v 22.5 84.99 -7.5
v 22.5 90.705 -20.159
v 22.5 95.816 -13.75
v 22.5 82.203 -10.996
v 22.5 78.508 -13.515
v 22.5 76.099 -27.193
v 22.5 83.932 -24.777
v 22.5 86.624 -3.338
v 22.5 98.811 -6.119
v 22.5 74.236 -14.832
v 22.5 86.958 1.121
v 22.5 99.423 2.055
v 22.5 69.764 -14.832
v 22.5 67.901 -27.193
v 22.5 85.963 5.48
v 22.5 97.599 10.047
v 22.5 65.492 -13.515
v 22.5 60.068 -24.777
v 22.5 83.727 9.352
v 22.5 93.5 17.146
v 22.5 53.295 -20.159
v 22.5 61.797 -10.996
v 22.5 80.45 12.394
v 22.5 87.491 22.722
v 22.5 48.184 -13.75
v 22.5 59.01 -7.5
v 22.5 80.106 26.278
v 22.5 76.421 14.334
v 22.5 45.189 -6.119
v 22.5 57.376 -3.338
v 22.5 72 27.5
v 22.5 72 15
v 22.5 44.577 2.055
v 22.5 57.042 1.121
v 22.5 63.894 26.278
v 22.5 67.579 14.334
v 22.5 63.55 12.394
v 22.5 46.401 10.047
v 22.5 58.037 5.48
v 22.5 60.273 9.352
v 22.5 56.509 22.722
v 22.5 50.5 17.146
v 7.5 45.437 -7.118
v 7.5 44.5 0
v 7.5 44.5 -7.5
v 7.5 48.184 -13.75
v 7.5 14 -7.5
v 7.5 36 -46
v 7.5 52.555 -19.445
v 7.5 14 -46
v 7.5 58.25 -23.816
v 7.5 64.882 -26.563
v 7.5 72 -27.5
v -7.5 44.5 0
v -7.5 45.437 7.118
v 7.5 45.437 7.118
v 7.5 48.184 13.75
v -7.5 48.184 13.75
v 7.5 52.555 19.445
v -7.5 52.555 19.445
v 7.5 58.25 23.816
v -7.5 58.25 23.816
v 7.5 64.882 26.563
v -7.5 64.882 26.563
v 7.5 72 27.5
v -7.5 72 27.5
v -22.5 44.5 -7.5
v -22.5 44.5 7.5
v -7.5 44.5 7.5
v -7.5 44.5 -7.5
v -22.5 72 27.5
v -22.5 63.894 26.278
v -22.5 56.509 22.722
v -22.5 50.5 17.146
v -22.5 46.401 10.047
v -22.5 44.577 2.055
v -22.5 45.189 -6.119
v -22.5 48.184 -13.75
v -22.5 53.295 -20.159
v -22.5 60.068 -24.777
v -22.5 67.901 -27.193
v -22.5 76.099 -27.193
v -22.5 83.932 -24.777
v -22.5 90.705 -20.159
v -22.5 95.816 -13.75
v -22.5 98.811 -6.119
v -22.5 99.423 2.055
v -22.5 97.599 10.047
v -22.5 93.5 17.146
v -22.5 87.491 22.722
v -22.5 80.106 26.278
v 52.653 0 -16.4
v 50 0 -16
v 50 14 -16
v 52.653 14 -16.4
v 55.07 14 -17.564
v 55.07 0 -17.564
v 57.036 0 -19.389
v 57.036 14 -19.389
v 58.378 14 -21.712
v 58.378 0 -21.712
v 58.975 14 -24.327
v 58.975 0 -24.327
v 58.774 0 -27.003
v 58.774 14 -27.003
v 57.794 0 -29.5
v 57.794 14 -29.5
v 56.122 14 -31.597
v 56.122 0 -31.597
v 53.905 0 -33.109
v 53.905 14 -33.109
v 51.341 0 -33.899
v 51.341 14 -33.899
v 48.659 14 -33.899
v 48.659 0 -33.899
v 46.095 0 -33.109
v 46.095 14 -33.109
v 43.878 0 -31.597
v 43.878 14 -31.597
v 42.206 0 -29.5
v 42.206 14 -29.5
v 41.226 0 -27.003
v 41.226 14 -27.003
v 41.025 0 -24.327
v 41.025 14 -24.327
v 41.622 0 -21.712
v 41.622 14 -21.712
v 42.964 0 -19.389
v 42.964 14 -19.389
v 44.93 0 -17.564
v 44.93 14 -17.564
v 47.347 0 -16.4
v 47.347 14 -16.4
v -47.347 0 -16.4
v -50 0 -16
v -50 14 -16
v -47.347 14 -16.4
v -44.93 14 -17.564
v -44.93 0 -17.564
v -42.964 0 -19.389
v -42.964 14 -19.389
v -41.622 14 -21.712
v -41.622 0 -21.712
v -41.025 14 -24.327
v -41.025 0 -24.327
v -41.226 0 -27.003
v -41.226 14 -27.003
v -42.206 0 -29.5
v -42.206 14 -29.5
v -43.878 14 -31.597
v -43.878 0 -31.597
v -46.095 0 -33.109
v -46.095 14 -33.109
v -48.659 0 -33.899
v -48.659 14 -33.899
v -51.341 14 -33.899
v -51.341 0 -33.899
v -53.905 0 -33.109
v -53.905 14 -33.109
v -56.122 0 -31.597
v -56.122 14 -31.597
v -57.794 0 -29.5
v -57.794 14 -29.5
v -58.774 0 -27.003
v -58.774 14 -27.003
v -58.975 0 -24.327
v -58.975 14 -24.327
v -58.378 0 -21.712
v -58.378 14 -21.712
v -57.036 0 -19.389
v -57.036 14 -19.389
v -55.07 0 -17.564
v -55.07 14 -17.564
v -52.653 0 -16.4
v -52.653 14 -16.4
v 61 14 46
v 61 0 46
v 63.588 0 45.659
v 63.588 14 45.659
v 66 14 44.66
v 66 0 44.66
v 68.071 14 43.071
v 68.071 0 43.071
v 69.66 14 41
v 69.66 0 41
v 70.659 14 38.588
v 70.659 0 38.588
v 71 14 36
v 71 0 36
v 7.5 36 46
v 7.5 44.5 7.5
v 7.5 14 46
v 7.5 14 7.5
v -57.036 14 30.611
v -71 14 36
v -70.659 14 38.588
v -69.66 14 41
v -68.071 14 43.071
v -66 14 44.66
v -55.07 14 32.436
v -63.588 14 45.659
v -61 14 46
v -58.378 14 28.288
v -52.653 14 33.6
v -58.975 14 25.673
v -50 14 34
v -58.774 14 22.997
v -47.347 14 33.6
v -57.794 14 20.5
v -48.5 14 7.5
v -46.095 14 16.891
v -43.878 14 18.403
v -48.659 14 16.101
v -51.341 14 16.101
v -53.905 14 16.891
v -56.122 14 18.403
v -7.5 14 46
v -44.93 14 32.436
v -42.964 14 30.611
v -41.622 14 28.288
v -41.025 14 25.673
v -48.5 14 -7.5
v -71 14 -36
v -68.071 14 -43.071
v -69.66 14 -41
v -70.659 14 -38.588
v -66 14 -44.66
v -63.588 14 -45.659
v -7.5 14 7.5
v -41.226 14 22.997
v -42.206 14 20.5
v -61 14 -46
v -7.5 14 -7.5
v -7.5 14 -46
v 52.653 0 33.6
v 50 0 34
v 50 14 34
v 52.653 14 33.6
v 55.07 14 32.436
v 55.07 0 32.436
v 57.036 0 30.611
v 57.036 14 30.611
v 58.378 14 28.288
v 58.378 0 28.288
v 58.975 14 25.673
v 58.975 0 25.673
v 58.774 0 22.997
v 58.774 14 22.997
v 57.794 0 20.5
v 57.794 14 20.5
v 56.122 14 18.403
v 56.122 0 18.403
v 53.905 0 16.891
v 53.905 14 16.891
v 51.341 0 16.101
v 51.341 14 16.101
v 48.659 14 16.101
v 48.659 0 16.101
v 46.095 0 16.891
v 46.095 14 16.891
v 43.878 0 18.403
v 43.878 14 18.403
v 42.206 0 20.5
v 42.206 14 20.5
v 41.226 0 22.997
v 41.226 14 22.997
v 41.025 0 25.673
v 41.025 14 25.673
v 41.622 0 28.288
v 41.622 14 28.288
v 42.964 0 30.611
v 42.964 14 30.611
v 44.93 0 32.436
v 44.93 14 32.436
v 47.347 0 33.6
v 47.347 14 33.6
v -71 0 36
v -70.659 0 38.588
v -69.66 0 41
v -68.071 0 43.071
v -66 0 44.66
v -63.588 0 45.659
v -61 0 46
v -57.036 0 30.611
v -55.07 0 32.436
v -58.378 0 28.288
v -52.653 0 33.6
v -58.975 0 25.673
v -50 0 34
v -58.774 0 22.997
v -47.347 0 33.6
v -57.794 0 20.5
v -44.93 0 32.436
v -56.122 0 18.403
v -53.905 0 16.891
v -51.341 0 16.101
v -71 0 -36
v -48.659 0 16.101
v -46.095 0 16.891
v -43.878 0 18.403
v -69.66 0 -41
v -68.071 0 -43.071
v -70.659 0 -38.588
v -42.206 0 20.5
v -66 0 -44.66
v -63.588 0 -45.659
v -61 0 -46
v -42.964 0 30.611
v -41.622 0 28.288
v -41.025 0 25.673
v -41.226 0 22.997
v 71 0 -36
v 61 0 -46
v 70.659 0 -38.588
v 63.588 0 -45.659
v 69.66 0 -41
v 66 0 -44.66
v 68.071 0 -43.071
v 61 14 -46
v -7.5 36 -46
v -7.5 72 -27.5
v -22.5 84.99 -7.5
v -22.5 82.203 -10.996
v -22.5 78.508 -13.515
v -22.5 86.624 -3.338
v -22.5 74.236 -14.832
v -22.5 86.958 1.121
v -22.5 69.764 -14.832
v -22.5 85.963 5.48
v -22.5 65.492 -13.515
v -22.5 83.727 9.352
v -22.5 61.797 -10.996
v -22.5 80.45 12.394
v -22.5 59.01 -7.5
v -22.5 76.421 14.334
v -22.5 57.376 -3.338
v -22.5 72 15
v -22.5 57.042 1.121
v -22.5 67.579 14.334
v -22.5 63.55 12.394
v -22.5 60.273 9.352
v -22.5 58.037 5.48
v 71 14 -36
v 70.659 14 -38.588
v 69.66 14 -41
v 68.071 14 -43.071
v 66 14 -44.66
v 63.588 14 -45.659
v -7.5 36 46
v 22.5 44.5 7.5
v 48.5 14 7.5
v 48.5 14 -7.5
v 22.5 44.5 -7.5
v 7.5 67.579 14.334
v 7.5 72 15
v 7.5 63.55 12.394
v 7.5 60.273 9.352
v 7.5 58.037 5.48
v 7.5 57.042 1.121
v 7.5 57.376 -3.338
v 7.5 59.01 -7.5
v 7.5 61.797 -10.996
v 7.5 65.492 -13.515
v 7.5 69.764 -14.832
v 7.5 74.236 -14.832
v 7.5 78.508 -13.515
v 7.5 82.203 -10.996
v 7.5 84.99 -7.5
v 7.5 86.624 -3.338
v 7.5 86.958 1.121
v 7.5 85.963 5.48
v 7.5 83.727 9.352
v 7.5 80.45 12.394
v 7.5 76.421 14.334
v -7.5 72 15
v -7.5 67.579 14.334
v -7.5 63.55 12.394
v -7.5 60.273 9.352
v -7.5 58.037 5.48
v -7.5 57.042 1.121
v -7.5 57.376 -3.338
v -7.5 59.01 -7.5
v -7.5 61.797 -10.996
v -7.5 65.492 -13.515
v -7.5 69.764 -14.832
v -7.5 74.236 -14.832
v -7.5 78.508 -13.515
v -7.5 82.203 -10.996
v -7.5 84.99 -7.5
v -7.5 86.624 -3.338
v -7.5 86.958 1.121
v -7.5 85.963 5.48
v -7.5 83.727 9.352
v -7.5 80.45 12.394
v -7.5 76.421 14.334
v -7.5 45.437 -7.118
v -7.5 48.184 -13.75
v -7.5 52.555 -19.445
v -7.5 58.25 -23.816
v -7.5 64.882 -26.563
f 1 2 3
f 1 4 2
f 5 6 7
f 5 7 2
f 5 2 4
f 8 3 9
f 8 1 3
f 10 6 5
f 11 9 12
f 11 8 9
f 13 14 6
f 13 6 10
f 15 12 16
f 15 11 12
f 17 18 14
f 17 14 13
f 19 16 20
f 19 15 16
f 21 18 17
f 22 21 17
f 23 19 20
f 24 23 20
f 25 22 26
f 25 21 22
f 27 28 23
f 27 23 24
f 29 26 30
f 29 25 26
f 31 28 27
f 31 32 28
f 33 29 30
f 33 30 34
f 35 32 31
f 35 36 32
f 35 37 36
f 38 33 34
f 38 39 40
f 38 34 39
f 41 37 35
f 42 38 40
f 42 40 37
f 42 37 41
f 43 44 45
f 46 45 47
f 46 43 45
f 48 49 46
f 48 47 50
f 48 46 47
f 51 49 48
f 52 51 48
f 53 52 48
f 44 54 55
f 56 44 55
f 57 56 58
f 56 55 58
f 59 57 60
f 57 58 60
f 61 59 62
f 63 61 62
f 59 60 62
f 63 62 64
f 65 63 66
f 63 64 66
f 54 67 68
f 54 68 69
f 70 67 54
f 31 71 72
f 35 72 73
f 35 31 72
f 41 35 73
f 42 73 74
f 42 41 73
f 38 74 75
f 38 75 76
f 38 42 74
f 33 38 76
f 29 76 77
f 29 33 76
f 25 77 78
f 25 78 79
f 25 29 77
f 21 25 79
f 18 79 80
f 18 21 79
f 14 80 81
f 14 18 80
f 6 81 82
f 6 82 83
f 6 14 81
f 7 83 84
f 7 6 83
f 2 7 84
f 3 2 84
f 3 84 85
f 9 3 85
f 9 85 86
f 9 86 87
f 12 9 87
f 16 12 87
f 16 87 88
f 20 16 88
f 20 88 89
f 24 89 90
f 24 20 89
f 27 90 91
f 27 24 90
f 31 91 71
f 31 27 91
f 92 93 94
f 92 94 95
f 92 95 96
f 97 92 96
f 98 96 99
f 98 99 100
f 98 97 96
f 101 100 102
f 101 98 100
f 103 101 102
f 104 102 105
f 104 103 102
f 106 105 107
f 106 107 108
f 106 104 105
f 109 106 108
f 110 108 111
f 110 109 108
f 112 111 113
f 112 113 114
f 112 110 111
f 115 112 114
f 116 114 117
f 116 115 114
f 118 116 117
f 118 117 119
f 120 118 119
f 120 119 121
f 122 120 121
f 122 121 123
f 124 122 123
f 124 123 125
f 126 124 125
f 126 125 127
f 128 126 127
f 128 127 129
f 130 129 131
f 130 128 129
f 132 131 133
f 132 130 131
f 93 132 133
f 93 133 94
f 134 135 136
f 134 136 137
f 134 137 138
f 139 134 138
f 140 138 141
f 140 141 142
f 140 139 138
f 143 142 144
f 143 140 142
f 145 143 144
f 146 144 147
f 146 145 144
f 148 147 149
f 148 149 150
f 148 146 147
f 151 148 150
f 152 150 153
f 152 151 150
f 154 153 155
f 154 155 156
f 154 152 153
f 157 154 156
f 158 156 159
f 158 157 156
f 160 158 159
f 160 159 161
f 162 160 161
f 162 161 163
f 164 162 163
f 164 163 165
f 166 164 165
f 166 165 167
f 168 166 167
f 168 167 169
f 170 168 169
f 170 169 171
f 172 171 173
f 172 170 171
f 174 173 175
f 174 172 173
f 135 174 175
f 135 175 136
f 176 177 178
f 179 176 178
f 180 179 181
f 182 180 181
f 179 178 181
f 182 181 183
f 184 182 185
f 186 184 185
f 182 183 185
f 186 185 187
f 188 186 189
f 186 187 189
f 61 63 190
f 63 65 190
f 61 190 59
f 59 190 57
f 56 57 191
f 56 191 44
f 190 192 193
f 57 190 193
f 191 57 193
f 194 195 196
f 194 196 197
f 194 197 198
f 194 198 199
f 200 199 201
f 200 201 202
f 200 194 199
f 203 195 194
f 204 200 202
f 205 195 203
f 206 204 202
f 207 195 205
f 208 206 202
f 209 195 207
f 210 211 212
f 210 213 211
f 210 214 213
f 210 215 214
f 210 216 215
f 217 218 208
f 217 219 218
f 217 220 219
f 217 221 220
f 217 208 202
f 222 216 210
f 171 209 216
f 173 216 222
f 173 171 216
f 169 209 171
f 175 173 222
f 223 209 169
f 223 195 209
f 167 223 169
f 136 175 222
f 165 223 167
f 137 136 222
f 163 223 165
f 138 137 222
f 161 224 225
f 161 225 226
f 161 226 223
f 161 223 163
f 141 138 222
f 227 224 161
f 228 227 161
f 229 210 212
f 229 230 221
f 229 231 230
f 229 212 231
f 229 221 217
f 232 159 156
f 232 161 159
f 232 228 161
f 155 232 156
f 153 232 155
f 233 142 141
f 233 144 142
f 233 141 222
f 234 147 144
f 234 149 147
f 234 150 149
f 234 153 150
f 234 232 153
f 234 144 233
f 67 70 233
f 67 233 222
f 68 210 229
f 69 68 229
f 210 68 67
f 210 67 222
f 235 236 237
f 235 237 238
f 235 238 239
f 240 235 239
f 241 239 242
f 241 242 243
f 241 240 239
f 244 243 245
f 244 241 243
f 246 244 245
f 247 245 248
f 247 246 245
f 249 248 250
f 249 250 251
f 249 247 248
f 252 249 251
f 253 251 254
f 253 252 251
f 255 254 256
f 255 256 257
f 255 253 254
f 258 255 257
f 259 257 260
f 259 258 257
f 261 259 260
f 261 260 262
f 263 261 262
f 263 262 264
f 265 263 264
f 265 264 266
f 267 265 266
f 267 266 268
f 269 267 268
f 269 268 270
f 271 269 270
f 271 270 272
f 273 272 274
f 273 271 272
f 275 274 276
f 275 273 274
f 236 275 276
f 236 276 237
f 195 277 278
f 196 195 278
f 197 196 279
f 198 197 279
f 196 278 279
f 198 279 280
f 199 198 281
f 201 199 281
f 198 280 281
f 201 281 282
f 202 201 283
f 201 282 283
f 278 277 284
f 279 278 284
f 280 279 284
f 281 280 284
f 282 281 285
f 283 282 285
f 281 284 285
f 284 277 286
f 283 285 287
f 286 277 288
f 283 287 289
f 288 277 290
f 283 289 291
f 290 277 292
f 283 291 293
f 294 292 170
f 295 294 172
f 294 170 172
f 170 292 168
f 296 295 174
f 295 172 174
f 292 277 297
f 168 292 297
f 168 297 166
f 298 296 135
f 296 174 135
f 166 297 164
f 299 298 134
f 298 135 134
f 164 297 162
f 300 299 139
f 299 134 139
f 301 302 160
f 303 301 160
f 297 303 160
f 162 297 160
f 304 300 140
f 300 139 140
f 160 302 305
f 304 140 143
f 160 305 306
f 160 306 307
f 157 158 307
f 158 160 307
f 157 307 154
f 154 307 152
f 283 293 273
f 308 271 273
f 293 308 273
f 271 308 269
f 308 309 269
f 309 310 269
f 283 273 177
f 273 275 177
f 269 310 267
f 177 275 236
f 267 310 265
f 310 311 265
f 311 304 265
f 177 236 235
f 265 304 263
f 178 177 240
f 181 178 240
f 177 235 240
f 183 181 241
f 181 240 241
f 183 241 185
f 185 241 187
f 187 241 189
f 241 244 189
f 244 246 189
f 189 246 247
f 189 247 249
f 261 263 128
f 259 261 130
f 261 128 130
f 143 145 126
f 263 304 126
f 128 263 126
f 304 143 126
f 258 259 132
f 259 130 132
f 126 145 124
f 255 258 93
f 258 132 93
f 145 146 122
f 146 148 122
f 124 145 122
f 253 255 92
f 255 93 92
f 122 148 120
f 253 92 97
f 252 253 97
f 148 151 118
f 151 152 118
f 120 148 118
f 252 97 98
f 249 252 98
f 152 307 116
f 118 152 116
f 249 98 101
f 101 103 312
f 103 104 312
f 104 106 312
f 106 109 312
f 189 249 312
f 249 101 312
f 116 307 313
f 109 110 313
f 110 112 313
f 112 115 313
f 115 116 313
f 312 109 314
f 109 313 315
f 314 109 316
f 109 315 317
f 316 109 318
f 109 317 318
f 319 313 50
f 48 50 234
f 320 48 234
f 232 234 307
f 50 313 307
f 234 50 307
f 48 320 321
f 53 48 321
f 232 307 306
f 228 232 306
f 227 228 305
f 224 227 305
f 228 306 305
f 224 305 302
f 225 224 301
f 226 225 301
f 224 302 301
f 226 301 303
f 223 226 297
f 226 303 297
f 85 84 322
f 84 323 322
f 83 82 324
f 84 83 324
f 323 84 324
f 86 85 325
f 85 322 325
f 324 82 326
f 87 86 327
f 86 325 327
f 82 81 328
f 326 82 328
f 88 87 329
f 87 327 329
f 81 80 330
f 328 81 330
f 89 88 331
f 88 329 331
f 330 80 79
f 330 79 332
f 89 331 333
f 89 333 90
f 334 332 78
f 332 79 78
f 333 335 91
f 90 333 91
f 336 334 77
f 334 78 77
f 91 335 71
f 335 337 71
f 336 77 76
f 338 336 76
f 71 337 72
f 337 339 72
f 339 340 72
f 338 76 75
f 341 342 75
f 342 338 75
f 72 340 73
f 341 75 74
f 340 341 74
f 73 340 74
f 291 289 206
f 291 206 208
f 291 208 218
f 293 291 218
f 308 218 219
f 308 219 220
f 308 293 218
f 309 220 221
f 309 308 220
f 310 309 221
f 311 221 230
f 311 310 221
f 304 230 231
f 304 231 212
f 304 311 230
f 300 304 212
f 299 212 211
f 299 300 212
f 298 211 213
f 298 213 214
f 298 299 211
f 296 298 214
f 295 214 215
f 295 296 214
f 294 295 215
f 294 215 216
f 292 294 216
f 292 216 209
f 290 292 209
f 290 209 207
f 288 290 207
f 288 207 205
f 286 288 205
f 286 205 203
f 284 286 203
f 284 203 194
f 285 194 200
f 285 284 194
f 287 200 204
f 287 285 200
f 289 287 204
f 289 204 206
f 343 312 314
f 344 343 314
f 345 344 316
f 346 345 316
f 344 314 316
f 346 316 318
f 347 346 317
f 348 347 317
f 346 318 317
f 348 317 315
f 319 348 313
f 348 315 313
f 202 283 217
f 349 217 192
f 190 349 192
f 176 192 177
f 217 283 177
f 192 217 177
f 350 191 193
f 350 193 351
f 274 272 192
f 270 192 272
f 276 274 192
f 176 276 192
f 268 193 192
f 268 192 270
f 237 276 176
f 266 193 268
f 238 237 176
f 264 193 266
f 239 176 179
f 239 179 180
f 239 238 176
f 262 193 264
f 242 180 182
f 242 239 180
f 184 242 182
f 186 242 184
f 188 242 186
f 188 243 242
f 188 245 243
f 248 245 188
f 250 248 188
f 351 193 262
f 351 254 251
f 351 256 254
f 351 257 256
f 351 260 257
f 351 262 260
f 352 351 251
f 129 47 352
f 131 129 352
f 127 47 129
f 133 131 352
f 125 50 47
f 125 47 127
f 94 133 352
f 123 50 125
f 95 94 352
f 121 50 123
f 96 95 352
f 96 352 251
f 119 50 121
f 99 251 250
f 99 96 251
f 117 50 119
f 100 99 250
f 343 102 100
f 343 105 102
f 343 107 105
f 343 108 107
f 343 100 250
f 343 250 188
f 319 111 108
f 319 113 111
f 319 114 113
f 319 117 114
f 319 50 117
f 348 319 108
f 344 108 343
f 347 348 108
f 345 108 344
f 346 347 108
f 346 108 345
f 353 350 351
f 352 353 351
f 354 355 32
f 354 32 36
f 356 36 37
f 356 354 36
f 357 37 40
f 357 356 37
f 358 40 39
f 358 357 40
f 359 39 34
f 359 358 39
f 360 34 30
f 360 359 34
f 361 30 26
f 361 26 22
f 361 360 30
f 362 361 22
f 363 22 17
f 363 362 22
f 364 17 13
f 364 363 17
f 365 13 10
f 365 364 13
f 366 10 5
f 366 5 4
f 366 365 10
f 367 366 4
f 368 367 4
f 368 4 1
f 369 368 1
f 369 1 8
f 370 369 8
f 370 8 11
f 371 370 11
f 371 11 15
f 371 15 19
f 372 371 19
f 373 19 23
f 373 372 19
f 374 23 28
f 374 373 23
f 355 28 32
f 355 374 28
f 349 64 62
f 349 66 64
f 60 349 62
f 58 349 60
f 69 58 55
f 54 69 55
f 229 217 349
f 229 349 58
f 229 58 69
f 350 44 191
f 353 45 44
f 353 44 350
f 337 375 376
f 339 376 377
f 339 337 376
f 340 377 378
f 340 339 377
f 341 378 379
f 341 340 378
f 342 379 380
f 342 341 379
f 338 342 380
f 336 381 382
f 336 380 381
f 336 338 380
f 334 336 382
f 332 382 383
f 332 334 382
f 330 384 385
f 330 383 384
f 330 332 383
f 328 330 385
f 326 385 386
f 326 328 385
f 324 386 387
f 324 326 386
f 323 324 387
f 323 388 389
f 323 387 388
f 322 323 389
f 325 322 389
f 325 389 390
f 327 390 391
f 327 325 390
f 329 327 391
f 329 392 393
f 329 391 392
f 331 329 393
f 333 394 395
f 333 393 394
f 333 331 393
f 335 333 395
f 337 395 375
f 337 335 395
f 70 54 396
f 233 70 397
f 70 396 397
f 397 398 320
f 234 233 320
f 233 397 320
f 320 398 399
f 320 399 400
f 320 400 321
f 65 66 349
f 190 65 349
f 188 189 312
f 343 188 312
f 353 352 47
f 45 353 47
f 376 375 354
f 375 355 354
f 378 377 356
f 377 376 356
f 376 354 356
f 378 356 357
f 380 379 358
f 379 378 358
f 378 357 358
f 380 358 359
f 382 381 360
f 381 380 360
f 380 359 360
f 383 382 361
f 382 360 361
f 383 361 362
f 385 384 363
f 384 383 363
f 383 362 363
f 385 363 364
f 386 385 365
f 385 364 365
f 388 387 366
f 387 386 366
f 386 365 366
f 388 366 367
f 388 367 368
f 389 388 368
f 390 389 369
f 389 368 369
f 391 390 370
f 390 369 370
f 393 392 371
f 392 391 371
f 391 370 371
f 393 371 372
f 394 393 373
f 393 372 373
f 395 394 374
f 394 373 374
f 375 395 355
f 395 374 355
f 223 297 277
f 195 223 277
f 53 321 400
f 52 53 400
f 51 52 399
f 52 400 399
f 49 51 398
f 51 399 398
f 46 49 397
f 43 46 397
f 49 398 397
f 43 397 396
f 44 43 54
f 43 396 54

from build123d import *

# Parameters (mm, degrees)
SKETCH1_R                = 9
BOSS_EXTRUDE1_DEPTH      = 14
BOSS_EXTRUDE1_2_DEPTH    = 14
SKETCH1_5_W              = 15
SKETCH1_5_H              = 38.5
BOSS_EXTRUDE2_DEPTH      = 36
BOSS_EXTRUDE3_DEPTH      = 44.5
CUT_EXTRUDE1_REACH       = 101.416
SKETCH3_R                = 27.5
SKETCH3_R_2              = 15
BOSS_EXTRUDE4_DEPTH      = 22.5
BOSS_EXTRUDE19_START     = -7.5
BOSS_EXTRUDE19_OUTLINE_R = 15
BOSS_EXTRUDE19_DEPTH     = 15
BOSS_EXTRUDE19_2_DEPTH   = 15
SKETCH4_R                = 15
CUT_EXTRUDE2_DEPTH       = 87.5


# Read off the part's stored shape, not the designer's step: Boss-Extrude19
with BuildPart() as part:
    # Sketch1 → Boss-Extrude1 (new body)
    with BuildSketch(Plane(origin=(0, 0, 0), x_dir=(1, 0, 0), z_dir=(0, 1, 0))):
        with BuildLine():
            Line((-7.5, 7.5), (-7.5, 46))
            Line((-7.5, 46), (-61, 46))
            ThreePointArc((-61, 46), (-68.071067812, 43.071067812), (-71, 36))
            Line((-71, 36), (-71, -36))
            ThreePointArc((-71, -36), (-68.071067812, -43.071067812), (-61, -46))
            Line((-61, -46), (-7.5, -46))
            Line((-7.5, -46), (-7.5, -7.5))
            Line((-7.5, -7.5), (-48.5, -7.5))
            Line((-48.5, -7.5), (-48.5, 7.5))
            Line((-48.5, 7.5), (-7.5, 7.5))
        make_face()
        with Locations(Location((-50, -25, 0), (0, 0, 270))):
            Circle(SKETCH1_R, mode=Mode.SUBTRACT)
        with Locations(Location((-50, 25, 0), (0, 0, 270))):
            Circle(SKETCH1_R, mode=Mode.SUBTRACT)
    extrude(amount=BOSS_EXTRUDE1_DEPTH)



with BuildPart() as body_2:
    # Sketch1 → Boss-Extrude1 2 (new body)
    with BuildSketch(Plane(origin=(0, 0, 0), x_dir=(1, 0, 0), z_dir=(0, 1, 0))):
        with BuildLine():
            ThreePointArc((71, 36), (68.071067812, 43.071067812), (61, 46))
            Line((61, 46), (7.5, 46))
            Line((7.5, 46), (7.5, 7.5))
            Line((7.5, 7.5), (48.5, 7.5))
            Line((48.5, 7.5), (48.5, -7.5))
            Line((48.5, -7.5), (7.5, -7.5))
            Line((7.5, -7.5), (7.5, -46))
            Line((7.5, -46), (61, -46))
            ThreePointArc((61, -46), (68.071067812, -43.071067812), (71, -36))
            Line((71, -36), (71, 36))
        make_face()
        with Locations(Location((50, -25, 0), (0, 0, 270))):
            Circle(SKETCH1_R, mode=Mode.SUBTRACT)
        with Locations(Location((50, 25, 0), (0, 0, 270))):
            Circle(SKETCH1_R, mode=Mode.SUBTRACT)
    extrude(amount=BOSS_EXTRUDE1_2_DEPTH)


with BuildPart() as part_1:
    add(part.part)

    add(body_2.part)  # Boss-Extrude2 merges body 2
    # Sketch1<5> → Boss-Extrude2 (add)
    with BuildSketch(Plane(origin=(0, 0, 0), x_dir=(1, 0, 0), z_dir=(0, 1, 0))):
        with Locations((0, -26.75)):
            Rectangle(SKETCH1_5_W, SKETCH1_5_H)
        with Locations((0, 26.75)):
            Rectangle(SKETCH1_5_W, SKETCH1_5_H)
    extrude(amount=BOSS_EXTRUDE2_DEPTH)

    # Sketch1<8> → Boss-Extrude3 (add)
    with BuildSketch(Plane(origin=(0, 0, 0), x_dir=(1, 0, 0), z_dir=(0, 1, 0))):
        Polygon((48.5, 7.5), (7.5, 7.5), (-7.5, 7.5), (-48.5, 7.5), (-48.5, -7.5), (-7.5, -7.5), (7.5, -7.5), (48.5, -7.5), align=None)
    extrude(amount=BOSS_EXTRUDE3_DEPTH)

    # Sketch2 → Cut-Extrude1 (cut, up to next)
    with BuildSketch(Plane.XY.offset(7.5), mode=Mode.PRIVATE) as cut_extrude1_sk1:
        Polygon((-22.5, 44.5), (-48.5, 14), (-48.5, 44.5), align=None)
    cut_extrude1_tool1 = extrude(cut_extrude1_sk1.sketch, amount=-CUT_EXTRUDE1_REACH, mode=Mode.PRIVATE) & part_1.part
    # Sketch2 → Cut-Extrude1 (cut, up to next)
    with BuildSketch(Plane.XY.offset(7.5), mode=Mode.PRIVATE) as cut_extrude1_sk2:
        Polygon((22.5, 44.5), (48.5, 14), (48.5, 44.5), align=None)
    cut_extrude1_tool2 = extrude(cut_extrude1_sk2.sketch, amount=-CUT_EXTRUDE1_REACH, mode=Mode.PRIVATE) & part_1.part
    add(cut_extrude1_tool1.solids().sort_by_distance((-39.833333, 34.333333, 7.5))[0], mode=Mode.SUBTRACT)
    add(cut_extrude1_tool2.solids().sort_by_distance((39.833333, 34.333333, 7.5))[0], mode=Mode.SUBTRACT)

    # Boss-Extrude19 2 outline → Boss-Extrude19 2 (add)
    with BuildSketch(Plane(origin=(0, 0, 0), x_dir=(0, 0, -1), z_dir=(1, 0, 0)).offset(BOSS_EXTRUDE19_START)):
        with BuildLine():
            Line((46, 36), (27.5, 72))
            ThreePointArc((27.5, 72), (19.445436483, 52.554563517), (0, 44.5))
            Line((0, 44.5), (7.5, 44.5))
            Line((7.5, 44.5), (7.5, 36))
            Line((7.5, 36), (46, 36))
        make_face()
        with BuildLine():
            Line((-7.5, 44.5), (0, 44.5))
            ThreePointArc((0, 44.5), (-19.445436483, 52.554563517), (-27.5, 72))
            Line((-27.5, 72), (-46, 36))
            Line((-46, 36), (-7.5, 36))
            Line((-7.5, 36), (-7.5, 44.5))
        make_face()
    extrude(amount=BOSS_EXTRUDE19_2_DEPTH)


with BuildPart() as body_2_2:
    # Sketch3 → Boss-Extrude4 (new, symmetric)
    with BuildSketch(Plane(origin=(0, 0, 0), x_dir=(0, 0, -1), z_dir=(1, 0, 0))):
        with Locations(Location((0, 72, 0), (0, 0, 180))):
            Circle(SKETCH3_R)
        with Locations(Location((0, 72, 0), (0, 0, 180))):
            Circle(SKETCH3_R_2, mode=Mode.SUBTRACT)
    extrude(amount=BOSS_EXTRUDE4_DEPTH, both=True)

    # Boss-Extrude19 outline → Boss-Extrude19 (add)
    with BuildSketch(Plane(origin=(0, 0, 0), x_dir=(0, 0, -1), z_dir=(1, 0, 0)).offset(BOSS_EXTRUDE19_START)):
        with Locations((0, 72)):
            Circle(BOSS_EXTRUDE19_OUTLINE_R)
    extrude(amount=BOSS_EXTRUDE19_DEPTH)

    # Sketch4 → Cut-Extrude2 (cut, symmetric)
    with BuildSketch(Plane(origin=(7.5, 0, 0), x_dir=(0, 0, -1), z_dir=(1, 0, 0))):
        with Locations(Location((0, 72, 0), (0, 0, 180))):
            Circle(SKETCH4_R)
    extrude(amount=CUT_EXTRUDE2_DEPTH, both=True, mode=Mode.SUBTRACT)


solid = Compound([part_1.part, body_2_2.part])
